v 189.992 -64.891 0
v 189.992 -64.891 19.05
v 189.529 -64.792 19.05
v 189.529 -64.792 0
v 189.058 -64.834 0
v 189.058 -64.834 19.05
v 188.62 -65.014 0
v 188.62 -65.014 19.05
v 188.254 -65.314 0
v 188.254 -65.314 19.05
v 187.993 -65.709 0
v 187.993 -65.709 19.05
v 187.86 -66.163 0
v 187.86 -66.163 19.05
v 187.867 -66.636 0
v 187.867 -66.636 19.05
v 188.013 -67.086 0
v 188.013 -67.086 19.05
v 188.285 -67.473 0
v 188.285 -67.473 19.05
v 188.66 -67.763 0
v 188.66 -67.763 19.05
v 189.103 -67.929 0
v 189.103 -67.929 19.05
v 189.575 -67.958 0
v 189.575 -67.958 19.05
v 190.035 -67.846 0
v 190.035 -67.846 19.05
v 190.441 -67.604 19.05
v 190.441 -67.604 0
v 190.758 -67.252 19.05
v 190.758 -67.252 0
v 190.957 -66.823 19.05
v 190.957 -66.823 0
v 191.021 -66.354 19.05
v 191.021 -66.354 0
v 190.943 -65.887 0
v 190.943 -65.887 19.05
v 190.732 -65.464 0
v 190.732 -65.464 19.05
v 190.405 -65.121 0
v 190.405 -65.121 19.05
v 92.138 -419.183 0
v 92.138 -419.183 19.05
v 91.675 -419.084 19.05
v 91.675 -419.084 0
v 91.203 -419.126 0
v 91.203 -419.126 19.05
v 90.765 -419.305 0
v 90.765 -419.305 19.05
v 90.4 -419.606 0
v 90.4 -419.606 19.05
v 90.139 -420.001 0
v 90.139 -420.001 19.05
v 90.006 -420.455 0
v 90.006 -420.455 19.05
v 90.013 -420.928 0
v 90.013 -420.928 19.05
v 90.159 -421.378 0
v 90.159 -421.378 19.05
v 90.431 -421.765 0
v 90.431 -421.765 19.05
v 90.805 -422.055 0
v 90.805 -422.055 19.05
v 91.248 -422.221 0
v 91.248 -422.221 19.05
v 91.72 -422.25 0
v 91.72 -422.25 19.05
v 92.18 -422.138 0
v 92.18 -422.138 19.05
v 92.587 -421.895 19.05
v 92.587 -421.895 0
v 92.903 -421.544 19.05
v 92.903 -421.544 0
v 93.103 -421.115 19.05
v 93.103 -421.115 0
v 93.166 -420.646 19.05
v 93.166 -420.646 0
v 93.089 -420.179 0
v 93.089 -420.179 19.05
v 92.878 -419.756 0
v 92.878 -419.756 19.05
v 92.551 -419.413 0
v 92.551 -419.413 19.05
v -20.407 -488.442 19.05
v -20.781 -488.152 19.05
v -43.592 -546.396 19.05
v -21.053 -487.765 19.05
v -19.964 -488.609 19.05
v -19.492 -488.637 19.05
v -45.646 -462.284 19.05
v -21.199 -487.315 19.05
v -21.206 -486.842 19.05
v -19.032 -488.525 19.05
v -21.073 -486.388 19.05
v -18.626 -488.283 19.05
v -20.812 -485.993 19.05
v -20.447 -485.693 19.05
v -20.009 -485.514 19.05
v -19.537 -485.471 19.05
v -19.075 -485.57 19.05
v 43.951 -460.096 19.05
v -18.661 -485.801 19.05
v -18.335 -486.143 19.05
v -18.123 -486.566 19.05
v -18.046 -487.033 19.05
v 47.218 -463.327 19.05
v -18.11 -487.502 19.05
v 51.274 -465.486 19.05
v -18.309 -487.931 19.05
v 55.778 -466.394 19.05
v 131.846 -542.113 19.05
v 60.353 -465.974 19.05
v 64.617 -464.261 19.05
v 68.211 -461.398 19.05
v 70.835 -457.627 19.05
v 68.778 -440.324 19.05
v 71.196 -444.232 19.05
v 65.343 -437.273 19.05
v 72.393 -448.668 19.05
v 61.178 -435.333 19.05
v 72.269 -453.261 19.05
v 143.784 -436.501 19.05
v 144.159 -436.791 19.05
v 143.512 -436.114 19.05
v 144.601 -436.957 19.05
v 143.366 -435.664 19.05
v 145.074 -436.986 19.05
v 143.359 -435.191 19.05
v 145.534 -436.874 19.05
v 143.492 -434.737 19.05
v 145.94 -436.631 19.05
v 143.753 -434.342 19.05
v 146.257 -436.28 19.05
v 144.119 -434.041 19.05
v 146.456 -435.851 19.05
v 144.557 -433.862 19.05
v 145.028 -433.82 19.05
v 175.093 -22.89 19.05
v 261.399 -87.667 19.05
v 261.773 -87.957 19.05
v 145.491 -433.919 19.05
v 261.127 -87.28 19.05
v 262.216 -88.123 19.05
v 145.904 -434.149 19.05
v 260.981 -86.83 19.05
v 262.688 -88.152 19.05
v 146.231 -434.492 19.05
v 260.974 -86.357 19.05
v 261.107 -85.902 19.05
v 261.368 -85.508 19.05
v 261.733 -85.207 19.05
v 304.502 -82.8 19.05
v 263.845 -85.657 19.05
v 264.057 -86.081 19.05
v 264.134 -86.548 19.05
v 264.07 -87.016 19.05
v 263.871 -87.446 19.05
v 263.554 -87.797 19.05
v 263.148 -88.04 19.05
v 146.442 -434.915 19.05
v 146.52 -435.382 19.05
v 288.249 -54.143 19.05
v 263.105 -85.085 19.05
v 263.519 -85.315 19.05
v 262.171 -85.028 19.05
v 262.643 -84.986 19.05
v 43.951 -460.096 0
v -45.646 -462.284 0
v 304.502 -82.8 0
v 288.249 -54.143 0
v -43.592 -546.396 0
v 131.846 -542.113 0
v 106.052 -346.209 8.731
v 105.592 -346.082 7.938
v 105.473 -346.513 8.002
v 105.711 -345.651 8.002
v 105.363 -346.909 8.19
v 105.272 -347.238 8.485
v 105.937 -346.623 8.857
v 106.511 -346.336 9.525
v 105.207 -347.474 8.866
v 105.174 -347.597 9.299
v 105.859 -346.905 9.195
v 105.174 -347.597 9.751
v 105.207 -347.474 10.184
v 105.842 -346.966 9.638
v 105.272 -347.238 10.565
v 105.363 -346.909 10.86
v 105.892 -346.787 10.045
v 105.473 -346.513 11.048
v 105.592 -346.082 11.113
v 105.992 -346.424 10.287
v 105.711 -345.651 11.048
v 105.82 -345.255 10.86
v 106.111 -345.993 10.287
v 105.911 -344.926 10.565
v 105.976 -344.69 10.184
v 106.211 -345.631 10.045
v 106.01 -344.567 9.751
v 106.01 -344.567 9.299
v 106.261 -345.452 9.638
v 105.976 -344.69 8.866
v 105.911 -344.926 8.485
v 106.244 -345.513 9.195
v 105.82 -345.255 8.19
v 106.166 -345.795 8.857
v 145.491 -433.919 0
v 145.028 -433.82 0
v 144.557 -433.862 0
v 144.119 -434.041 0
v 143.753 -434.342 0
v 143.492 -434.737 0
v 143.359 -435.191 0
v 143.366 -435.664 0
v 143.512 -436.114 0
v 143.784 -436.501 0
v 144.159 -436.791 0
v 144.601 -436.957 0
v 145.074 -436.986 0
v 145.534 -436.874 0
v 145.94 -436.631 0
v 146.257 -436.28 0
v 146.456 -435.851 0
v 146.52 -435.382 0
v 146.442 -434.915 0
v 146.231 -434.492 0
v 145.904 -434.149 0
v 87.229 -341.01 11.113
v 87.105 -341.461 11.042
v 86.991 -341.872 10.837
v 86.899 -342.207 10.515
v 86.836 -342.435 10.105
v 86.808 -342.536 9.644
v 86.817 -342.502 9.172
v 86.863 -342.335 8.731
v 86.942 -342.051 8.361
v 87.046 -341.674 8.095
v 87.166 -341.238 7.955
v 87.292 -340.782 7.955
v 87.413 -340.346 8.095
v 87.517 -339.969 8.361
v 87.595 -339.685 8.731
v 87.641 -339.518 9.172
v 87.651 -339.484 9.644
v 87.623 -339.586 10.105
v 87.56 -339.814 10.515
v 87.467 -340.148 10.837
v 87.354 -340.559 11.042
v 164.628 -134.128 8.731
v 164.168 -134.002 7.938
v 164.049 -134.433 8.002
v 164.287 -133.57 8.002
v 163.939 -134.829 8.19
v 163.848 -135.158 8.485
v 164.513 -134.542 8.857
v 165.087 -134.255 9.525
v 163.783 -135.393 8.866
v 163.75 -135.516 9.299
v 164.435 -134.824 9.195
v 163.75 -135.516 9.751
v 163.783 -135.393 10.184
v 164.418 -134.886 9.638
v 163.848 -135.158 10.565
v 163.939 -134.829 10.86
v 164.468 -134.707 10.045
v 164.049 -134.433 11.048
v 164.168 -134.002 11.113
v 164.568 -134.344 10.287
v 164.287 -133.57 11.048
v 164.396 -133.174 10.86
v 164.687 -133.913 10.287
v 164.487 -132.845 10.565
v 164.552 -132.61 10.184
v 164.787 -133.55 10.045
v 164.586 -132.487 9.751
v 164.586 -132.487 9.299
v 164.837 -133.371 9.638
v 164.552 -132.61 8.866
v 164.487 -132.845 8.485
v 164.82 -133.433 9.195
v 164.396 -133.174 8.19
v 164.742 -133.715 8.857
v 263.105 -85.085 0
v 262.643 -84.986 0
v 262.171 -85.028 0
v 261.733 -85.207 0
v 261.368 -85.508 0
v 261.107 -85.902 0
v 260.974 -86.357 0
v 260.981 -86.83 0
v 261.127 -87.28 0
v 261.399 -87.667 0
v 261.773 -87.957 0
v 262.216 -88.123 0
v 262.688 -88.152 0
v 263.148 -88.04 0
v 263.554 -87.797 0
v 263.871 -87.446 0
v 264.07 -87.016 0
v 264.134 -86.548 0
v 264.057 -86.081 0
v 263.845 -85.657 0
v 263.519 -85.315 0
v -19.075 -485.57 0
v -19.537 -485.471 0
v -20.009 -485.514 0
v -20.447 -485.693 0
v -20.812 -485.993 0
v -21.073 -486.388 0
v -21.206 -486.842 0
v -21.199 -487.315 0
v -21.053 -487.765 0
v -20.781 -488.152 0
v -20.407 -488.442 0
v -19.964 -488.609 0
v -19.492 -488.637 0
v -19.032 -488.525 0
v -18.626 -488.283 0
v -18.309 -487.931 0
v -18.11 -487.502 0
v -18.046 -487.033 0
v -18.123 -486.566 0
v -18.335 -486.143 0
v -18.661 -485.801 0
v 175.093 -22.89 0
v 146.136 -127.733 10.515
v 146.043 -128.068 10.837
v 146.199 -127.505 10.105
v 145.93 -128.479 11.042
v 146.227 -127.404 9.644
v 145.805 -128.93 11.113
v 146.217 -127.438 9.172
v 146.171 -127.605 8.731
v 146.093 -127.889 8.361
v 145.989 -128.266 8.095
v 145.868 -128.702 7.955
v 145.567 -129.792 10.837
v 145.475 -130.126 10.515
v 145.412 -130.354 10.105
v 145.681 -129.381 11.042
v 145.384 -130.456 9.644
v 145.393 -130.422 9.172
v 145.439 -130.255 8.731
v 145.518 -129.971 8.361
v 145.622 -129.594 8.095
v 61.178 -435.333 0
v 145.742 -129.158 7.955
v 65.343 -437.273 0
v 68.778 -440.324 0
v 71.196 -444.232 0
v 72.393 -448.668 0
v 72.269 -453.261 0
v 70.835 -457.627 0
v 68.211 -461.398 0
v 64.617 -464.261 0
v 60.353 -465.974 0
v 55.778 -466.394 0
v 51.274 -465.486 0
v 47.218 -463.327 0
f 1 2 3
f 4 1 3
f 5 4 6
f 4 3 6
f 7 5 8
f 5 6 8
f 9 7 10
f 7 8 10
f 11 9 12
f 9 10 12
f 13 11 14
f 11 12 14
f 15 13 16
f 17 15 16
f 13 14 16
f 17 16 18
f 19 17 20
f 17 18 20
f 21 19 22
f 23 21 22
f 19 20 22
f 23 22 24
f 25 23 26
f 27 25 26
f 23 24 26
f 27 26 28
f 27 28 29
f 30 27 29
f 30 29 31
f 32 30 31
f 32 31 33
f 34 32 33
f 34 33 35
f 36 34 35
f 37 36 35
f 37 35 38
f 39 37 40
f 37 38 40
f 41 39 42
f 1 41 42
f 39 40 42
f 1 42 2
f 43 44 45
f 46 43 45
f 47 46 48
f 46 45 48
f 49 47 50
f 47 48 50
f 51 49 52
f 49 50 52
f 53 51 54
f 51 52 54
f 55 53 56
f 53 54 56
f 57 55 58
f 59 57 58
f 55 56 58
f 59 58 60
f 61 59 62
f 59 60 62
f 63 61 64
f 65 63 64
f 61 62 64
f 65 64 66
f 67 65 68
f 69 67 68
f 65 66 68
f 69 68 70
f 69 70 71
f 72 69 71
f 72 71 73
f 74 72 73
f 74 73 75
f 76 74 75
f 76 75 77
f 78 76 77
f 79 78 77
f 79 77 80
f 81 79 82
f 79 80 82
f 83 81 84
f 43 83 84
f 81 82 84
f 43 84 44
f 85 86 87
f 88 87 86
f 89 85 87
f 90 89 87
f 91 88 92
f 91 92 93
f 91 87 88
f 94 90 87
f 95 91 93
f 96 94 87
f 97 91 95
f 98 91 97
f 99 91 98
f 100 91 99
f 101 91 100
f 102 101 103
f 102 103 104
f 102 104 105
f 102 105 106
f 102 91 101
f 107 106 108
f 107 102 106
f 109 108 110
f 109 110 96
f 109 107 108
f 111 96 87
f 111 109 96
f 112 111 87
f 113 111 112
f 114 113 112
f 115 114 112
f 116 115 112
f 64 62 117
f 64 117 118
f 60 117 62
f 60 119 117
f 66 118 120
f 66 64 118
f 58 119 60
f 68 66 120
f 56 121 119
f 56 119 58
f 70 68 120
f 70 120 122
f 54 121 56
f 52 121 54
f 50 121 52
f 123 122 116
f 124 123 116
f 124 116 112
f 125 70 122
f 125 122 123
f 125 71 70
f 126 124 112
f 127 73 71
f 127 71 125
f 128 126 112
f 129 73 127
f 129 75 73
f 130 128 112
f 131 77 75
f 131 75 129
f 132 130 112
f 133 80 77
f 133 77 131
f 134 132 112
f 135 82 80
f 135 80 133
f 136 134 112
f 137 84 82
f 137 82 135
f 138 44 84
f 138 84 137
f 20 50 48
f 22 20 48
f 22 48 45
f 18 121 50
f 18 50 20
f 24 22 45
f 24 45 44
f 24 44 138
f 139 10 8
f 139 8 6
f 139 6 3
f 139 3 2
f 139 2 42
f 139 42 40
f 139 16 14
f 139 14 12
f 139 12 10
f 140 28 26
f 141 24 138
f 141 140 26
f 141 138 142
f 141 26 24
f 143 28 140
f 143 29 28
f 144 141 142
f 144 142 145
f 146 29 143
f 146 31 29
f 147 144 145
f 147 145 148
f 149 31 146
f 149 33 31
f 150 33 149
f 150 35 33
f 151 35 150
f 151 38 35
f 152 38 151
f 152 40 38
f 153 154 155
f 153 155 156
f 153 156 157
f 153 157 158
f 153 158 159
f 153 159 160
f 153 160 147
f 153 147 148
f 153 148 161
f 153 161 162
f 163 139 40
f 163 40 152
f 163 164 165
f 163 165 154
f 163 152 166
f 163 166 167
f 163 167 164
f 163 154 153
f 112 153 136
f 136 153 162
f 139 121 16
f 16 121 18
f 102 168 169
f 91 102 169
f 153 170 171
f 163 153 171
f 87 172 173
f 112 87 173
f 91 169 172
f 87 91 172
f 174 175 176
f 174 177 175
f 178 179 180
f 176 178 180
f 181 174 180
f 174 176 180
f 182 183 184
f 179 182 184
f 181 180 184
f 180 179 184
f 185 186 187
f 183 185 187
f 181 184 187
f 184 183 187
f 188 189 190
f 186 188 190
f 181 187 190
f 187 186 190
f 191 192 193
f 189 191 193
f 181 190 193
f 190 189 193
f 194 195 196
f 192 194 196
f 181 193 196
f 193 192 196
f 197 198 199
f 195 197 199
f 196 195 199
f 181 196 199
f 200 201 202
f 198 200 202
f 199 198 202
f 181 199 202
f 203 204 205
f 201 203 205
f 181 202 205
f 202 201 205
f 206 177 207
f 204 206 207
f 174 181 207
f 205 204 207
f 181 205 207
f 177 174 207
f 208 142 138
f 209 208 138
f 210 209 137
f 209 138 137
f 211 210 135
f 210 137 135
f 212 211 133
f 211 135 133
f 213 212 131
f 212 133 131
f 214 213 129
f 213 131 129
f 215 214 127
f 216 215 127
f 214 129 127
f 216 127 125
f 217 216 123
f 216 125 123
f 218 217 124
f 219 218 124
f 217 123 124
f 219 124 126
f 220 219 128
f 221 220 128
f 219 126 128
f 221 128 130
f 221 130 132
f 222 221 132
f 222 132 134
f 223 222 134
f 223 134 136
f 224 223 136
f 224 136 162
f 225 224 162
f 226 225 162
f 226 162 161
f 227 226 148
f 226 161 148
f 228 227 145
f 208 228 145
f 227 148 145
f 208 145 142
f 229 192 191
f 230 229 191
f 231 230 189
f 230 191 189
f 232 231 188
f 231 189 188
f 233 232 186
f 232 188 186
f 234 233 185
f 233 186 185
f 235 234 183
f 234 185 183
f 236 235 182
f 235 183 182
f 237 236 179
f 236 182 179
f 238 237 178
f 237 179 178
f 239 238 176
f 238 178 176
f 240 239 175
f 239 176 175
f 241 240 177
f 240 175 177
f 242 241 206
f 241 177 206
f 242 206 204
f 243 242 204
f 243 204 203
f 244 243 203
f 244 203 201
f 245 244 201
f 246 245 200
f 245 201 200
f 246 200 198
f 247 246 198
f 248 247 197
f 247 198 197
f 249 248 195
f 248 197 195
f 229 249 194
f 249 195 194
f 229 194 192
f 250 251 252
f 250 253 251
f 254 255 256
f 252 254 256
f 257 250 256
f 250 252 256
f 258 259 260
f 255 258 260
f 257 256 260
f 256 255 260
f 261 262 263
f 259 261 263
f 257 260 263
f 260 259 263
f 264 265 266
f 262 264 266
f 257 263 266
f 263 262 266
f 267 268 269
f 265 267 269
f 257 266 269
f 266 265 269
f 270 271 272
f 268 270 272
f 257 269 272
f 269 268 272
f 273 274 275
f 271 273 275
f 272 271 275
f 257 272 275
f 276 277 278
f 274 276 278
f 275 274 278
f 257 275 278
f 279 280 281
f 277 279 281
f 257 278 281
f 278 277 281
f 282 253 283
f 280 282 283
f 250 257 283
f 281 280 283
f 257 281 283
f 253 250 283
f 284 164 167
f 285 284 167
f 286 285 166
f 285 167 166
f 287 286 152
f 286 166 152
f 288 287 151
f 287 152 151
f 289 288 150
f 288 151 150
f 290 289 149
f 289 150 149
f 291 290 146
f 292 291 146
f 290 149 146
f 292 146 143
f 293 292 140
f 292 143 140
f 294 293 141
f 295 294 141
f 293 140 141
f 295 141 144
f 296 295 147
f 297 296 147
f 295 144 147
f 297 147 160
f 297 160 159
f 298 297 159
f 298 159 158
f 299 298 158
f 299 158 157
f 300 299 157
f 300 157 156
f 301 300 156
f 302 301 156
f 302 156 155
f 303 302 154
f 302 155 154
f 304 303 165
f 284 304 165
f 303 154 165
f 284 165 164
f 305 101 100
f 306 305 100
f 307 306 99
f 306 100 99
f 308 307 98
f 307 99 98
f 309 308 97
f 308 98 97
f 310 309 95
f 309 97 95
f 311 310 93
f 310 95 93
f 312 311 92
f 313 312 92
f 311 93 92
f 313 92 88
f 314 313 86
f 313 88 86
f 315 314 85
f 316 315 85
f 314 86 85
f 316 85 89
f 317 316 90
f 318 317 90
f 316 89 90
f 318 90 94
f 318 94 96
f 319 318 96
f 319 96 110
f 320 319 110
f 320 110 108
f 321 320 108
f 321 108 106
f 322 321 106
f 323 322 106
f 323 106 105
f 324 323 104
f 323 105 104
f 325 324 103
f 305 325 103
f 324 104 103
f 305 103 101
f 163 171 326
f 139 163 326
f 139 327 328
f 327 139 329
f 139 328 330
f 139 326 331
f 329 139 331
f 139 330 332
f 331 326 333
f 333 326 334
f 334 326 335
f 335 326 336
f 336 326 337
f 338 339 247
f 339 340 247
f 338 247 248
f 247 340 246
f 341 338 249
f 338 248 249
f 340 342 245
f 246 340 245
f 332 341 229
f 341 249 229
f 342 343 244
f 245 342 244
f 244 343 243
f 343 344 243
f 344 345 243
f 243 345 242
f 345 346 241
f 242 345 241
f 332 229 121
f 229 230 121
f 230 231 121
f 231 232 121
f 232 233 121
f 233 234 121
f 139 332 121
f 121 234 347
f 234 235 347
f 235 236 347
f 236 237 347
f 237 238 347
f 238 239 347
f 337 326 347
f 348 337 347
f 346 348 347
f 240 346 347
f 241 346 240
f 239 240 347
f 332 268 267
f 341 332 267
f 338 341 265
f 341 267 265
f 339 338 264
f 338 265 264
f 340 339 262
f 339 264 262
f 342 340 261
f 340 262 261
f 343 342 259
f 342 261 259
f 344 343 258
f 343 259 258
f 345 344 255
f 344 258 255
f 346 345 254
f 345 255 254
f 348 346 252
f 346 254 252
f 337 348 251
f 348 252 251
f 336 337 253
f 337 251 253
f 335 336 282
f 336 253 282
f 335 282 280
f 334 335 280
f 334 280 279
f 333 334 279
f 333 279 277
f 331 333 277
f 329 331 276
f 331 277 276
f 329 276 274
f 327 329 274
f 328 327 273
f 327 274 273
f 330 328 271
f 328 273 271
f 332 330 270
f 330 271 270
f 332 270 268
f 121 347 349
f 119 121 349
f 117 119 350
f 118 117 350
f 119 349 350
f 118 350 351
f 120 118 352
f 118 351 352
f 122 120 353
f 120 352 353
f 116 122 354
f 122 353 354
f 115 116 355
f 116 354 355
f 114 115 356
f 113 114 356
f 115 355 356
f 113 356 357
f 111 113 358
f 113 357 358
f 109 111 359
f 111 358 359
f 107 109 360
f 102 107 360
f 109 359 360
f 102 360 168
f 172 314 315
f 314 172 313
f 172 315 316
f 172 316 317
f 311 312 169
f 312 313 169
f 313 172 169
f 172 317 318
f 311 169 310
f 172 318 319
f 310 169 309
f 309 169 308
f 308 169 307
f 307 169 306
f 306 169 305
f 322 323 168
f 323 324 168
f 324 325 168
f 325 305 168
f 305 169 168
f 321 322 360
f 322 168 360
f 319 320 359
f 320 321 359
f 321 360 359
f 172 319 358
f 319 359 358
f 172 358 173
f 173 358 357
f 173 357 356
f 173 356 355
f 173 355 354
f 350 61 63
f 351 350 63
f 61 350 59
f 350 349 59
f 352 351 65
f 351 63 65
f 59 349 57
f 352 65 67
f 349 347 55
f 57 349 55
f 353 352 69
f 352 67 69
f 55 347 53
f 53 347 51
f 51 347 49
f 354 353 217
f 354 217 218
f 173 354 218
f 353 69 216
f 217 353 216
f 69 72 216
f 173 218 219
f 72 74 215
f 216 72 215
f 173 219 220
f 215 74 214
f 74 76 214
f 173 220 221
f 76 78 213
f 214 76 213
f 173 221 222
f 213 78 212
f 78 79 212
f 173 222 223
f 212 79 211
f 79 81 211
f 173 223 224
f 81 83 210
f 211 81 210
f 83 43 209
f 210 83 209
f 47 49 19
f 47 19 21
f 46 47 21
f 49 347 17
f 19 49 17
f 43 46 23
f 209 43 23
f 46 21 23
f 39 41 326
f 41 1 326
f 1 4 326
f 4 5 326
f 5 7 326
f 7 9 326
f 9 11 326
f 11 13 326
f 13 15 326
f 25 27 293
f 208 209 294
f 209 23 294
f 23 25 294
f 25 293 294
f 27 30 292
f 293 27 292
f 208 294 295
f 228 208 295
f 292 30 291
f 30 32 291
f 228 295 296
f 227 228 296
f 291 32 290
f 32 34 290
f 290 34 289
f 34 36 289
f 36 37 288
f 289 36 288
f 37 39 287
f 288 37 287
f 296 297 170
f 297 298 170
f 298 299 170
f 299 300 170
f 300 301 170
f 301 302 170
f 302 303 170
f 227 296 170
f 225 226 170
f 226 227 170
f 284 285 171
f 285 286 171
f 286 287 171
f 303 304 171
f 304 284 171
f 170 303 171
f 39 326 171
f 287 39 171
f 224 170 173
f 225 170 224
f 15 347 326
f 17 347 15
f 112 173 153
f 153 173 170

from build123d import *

# Parameters (mm, degrees)
BOSS_EXTRUDE1_DEPTH = 19.05
HOLE2_D             = 3.175
HOLE2_DEPTH         = 31.75
HOLE2_CSINK_D       = 10.16
HOLE2_CSINK_ANGLE   = 82
HOLE2_TIP           = 0.953866233
HOLE3_D             = 3.175
HOLE3_DEPTH         = 38.1
HOLE3_CSINK_D       = 10.16
HOLE3_CSINK_ANGLE   = 82
HOLE3_TIP           = 0.953866233


with BuildPart() as part:
    # Sketch1 → Boss-Extrude1 (new body)
    with BuildSketch(Plane.XY):
        with BuildLine():
            Line((-45.645654956, -462.283590669), (-43.591869521, -546.396382838))
            Line((-43.591869521, -546.396382838), (131.845939781, -542.11271078))
            Line((131.845939781, -542.11271078), (304.502022379, -82.799914861))
            Line((304.502022379, -82.799914861), (288.249001778, -54.142860136))
            Line((288.249001778, -54.142860136), (175.093421906, -22.889613201))
            Line((175.093421906, -22.889613201), (61.177817241, -435.332721236))
            ThreePointArc((61.177817241, -435.332721236), (69.660650717, -459.60790015), (43.950640658, -460.09591431))
            Line((43.950640658, -460.09591431), (-45.645654956, -462.283590669))
        make_face()
    extrude(amount=BOSS_EXTRUDE1_DEPTH)

    # Hole2
    with Locations(Plane(origin=(162.245907498, -21.702082459, 165.474999994), x_dir=(0, 0, -1), z_dir=(-0.9639097761610324, 0.2662291182819574, 0))):
        with Locations((-155.949999994, 107.734820482), (155.949999994, 107.734820482), (155.949999994, 327.755881328), (174.999999994, 85.732714397), (174.999999994, 349.757987412), (-174.999999994, 349.757987412), (-174.999999994, 85.732714397), (-155.949999994, 327.755881328)):
            CounterSinkHole(HOLE2_D / 2, HOLE2_CSINK_D / 2, depth=HOLE2_DEPTH, counter_sink_angle=HOLE2_CSINK_ANGLE)
            with Locations((0, 0, -(HOLE2_DEPTH + HOLE2_TIP / 2))):  # 118° drill point
                Cone(0, HOLE2_D / 2, HOLE2_TIP, mode=Mode.SUBTRACT)

    # Hole3
    with Locations(Plane(origin=(311.92831292, -63.043933951, -19.05), x_dir=(-0.3518626346959965, -0.9360516472421764, 8.51430303154421e-15), z_dir=(0, 0, -1))):
        with Locations((46.221112845, 113.488854888), (39.39759596, 37.945520226), (412.28786892, 80.423559293), (407.308516105, 25.297013484), (513.561319184, 161.164706775), (597.46020397, 127.267357003), (610.543339245, 159.649253123), (694.322923815, 367.011001477), (526.644454459, 193.546602895), (610.424039029, 400.908351249)):
            CounterSinkHole(HOLE3_D / 2, HOLE3_CSINK_D / 2, depth=HOLE3_DEPTH, counter_sink_angle=HOLE3_CSINK_ANGLE)
            with Locations((0, 0, -(HOLE3_DEPTH + HOLE3_TIP / 2))):  # 118° drill point
                Cone(0, HOLE3_D / 2, HOLE3_TIP, mode=Mode.SUBTRACT)


solid = part.part
